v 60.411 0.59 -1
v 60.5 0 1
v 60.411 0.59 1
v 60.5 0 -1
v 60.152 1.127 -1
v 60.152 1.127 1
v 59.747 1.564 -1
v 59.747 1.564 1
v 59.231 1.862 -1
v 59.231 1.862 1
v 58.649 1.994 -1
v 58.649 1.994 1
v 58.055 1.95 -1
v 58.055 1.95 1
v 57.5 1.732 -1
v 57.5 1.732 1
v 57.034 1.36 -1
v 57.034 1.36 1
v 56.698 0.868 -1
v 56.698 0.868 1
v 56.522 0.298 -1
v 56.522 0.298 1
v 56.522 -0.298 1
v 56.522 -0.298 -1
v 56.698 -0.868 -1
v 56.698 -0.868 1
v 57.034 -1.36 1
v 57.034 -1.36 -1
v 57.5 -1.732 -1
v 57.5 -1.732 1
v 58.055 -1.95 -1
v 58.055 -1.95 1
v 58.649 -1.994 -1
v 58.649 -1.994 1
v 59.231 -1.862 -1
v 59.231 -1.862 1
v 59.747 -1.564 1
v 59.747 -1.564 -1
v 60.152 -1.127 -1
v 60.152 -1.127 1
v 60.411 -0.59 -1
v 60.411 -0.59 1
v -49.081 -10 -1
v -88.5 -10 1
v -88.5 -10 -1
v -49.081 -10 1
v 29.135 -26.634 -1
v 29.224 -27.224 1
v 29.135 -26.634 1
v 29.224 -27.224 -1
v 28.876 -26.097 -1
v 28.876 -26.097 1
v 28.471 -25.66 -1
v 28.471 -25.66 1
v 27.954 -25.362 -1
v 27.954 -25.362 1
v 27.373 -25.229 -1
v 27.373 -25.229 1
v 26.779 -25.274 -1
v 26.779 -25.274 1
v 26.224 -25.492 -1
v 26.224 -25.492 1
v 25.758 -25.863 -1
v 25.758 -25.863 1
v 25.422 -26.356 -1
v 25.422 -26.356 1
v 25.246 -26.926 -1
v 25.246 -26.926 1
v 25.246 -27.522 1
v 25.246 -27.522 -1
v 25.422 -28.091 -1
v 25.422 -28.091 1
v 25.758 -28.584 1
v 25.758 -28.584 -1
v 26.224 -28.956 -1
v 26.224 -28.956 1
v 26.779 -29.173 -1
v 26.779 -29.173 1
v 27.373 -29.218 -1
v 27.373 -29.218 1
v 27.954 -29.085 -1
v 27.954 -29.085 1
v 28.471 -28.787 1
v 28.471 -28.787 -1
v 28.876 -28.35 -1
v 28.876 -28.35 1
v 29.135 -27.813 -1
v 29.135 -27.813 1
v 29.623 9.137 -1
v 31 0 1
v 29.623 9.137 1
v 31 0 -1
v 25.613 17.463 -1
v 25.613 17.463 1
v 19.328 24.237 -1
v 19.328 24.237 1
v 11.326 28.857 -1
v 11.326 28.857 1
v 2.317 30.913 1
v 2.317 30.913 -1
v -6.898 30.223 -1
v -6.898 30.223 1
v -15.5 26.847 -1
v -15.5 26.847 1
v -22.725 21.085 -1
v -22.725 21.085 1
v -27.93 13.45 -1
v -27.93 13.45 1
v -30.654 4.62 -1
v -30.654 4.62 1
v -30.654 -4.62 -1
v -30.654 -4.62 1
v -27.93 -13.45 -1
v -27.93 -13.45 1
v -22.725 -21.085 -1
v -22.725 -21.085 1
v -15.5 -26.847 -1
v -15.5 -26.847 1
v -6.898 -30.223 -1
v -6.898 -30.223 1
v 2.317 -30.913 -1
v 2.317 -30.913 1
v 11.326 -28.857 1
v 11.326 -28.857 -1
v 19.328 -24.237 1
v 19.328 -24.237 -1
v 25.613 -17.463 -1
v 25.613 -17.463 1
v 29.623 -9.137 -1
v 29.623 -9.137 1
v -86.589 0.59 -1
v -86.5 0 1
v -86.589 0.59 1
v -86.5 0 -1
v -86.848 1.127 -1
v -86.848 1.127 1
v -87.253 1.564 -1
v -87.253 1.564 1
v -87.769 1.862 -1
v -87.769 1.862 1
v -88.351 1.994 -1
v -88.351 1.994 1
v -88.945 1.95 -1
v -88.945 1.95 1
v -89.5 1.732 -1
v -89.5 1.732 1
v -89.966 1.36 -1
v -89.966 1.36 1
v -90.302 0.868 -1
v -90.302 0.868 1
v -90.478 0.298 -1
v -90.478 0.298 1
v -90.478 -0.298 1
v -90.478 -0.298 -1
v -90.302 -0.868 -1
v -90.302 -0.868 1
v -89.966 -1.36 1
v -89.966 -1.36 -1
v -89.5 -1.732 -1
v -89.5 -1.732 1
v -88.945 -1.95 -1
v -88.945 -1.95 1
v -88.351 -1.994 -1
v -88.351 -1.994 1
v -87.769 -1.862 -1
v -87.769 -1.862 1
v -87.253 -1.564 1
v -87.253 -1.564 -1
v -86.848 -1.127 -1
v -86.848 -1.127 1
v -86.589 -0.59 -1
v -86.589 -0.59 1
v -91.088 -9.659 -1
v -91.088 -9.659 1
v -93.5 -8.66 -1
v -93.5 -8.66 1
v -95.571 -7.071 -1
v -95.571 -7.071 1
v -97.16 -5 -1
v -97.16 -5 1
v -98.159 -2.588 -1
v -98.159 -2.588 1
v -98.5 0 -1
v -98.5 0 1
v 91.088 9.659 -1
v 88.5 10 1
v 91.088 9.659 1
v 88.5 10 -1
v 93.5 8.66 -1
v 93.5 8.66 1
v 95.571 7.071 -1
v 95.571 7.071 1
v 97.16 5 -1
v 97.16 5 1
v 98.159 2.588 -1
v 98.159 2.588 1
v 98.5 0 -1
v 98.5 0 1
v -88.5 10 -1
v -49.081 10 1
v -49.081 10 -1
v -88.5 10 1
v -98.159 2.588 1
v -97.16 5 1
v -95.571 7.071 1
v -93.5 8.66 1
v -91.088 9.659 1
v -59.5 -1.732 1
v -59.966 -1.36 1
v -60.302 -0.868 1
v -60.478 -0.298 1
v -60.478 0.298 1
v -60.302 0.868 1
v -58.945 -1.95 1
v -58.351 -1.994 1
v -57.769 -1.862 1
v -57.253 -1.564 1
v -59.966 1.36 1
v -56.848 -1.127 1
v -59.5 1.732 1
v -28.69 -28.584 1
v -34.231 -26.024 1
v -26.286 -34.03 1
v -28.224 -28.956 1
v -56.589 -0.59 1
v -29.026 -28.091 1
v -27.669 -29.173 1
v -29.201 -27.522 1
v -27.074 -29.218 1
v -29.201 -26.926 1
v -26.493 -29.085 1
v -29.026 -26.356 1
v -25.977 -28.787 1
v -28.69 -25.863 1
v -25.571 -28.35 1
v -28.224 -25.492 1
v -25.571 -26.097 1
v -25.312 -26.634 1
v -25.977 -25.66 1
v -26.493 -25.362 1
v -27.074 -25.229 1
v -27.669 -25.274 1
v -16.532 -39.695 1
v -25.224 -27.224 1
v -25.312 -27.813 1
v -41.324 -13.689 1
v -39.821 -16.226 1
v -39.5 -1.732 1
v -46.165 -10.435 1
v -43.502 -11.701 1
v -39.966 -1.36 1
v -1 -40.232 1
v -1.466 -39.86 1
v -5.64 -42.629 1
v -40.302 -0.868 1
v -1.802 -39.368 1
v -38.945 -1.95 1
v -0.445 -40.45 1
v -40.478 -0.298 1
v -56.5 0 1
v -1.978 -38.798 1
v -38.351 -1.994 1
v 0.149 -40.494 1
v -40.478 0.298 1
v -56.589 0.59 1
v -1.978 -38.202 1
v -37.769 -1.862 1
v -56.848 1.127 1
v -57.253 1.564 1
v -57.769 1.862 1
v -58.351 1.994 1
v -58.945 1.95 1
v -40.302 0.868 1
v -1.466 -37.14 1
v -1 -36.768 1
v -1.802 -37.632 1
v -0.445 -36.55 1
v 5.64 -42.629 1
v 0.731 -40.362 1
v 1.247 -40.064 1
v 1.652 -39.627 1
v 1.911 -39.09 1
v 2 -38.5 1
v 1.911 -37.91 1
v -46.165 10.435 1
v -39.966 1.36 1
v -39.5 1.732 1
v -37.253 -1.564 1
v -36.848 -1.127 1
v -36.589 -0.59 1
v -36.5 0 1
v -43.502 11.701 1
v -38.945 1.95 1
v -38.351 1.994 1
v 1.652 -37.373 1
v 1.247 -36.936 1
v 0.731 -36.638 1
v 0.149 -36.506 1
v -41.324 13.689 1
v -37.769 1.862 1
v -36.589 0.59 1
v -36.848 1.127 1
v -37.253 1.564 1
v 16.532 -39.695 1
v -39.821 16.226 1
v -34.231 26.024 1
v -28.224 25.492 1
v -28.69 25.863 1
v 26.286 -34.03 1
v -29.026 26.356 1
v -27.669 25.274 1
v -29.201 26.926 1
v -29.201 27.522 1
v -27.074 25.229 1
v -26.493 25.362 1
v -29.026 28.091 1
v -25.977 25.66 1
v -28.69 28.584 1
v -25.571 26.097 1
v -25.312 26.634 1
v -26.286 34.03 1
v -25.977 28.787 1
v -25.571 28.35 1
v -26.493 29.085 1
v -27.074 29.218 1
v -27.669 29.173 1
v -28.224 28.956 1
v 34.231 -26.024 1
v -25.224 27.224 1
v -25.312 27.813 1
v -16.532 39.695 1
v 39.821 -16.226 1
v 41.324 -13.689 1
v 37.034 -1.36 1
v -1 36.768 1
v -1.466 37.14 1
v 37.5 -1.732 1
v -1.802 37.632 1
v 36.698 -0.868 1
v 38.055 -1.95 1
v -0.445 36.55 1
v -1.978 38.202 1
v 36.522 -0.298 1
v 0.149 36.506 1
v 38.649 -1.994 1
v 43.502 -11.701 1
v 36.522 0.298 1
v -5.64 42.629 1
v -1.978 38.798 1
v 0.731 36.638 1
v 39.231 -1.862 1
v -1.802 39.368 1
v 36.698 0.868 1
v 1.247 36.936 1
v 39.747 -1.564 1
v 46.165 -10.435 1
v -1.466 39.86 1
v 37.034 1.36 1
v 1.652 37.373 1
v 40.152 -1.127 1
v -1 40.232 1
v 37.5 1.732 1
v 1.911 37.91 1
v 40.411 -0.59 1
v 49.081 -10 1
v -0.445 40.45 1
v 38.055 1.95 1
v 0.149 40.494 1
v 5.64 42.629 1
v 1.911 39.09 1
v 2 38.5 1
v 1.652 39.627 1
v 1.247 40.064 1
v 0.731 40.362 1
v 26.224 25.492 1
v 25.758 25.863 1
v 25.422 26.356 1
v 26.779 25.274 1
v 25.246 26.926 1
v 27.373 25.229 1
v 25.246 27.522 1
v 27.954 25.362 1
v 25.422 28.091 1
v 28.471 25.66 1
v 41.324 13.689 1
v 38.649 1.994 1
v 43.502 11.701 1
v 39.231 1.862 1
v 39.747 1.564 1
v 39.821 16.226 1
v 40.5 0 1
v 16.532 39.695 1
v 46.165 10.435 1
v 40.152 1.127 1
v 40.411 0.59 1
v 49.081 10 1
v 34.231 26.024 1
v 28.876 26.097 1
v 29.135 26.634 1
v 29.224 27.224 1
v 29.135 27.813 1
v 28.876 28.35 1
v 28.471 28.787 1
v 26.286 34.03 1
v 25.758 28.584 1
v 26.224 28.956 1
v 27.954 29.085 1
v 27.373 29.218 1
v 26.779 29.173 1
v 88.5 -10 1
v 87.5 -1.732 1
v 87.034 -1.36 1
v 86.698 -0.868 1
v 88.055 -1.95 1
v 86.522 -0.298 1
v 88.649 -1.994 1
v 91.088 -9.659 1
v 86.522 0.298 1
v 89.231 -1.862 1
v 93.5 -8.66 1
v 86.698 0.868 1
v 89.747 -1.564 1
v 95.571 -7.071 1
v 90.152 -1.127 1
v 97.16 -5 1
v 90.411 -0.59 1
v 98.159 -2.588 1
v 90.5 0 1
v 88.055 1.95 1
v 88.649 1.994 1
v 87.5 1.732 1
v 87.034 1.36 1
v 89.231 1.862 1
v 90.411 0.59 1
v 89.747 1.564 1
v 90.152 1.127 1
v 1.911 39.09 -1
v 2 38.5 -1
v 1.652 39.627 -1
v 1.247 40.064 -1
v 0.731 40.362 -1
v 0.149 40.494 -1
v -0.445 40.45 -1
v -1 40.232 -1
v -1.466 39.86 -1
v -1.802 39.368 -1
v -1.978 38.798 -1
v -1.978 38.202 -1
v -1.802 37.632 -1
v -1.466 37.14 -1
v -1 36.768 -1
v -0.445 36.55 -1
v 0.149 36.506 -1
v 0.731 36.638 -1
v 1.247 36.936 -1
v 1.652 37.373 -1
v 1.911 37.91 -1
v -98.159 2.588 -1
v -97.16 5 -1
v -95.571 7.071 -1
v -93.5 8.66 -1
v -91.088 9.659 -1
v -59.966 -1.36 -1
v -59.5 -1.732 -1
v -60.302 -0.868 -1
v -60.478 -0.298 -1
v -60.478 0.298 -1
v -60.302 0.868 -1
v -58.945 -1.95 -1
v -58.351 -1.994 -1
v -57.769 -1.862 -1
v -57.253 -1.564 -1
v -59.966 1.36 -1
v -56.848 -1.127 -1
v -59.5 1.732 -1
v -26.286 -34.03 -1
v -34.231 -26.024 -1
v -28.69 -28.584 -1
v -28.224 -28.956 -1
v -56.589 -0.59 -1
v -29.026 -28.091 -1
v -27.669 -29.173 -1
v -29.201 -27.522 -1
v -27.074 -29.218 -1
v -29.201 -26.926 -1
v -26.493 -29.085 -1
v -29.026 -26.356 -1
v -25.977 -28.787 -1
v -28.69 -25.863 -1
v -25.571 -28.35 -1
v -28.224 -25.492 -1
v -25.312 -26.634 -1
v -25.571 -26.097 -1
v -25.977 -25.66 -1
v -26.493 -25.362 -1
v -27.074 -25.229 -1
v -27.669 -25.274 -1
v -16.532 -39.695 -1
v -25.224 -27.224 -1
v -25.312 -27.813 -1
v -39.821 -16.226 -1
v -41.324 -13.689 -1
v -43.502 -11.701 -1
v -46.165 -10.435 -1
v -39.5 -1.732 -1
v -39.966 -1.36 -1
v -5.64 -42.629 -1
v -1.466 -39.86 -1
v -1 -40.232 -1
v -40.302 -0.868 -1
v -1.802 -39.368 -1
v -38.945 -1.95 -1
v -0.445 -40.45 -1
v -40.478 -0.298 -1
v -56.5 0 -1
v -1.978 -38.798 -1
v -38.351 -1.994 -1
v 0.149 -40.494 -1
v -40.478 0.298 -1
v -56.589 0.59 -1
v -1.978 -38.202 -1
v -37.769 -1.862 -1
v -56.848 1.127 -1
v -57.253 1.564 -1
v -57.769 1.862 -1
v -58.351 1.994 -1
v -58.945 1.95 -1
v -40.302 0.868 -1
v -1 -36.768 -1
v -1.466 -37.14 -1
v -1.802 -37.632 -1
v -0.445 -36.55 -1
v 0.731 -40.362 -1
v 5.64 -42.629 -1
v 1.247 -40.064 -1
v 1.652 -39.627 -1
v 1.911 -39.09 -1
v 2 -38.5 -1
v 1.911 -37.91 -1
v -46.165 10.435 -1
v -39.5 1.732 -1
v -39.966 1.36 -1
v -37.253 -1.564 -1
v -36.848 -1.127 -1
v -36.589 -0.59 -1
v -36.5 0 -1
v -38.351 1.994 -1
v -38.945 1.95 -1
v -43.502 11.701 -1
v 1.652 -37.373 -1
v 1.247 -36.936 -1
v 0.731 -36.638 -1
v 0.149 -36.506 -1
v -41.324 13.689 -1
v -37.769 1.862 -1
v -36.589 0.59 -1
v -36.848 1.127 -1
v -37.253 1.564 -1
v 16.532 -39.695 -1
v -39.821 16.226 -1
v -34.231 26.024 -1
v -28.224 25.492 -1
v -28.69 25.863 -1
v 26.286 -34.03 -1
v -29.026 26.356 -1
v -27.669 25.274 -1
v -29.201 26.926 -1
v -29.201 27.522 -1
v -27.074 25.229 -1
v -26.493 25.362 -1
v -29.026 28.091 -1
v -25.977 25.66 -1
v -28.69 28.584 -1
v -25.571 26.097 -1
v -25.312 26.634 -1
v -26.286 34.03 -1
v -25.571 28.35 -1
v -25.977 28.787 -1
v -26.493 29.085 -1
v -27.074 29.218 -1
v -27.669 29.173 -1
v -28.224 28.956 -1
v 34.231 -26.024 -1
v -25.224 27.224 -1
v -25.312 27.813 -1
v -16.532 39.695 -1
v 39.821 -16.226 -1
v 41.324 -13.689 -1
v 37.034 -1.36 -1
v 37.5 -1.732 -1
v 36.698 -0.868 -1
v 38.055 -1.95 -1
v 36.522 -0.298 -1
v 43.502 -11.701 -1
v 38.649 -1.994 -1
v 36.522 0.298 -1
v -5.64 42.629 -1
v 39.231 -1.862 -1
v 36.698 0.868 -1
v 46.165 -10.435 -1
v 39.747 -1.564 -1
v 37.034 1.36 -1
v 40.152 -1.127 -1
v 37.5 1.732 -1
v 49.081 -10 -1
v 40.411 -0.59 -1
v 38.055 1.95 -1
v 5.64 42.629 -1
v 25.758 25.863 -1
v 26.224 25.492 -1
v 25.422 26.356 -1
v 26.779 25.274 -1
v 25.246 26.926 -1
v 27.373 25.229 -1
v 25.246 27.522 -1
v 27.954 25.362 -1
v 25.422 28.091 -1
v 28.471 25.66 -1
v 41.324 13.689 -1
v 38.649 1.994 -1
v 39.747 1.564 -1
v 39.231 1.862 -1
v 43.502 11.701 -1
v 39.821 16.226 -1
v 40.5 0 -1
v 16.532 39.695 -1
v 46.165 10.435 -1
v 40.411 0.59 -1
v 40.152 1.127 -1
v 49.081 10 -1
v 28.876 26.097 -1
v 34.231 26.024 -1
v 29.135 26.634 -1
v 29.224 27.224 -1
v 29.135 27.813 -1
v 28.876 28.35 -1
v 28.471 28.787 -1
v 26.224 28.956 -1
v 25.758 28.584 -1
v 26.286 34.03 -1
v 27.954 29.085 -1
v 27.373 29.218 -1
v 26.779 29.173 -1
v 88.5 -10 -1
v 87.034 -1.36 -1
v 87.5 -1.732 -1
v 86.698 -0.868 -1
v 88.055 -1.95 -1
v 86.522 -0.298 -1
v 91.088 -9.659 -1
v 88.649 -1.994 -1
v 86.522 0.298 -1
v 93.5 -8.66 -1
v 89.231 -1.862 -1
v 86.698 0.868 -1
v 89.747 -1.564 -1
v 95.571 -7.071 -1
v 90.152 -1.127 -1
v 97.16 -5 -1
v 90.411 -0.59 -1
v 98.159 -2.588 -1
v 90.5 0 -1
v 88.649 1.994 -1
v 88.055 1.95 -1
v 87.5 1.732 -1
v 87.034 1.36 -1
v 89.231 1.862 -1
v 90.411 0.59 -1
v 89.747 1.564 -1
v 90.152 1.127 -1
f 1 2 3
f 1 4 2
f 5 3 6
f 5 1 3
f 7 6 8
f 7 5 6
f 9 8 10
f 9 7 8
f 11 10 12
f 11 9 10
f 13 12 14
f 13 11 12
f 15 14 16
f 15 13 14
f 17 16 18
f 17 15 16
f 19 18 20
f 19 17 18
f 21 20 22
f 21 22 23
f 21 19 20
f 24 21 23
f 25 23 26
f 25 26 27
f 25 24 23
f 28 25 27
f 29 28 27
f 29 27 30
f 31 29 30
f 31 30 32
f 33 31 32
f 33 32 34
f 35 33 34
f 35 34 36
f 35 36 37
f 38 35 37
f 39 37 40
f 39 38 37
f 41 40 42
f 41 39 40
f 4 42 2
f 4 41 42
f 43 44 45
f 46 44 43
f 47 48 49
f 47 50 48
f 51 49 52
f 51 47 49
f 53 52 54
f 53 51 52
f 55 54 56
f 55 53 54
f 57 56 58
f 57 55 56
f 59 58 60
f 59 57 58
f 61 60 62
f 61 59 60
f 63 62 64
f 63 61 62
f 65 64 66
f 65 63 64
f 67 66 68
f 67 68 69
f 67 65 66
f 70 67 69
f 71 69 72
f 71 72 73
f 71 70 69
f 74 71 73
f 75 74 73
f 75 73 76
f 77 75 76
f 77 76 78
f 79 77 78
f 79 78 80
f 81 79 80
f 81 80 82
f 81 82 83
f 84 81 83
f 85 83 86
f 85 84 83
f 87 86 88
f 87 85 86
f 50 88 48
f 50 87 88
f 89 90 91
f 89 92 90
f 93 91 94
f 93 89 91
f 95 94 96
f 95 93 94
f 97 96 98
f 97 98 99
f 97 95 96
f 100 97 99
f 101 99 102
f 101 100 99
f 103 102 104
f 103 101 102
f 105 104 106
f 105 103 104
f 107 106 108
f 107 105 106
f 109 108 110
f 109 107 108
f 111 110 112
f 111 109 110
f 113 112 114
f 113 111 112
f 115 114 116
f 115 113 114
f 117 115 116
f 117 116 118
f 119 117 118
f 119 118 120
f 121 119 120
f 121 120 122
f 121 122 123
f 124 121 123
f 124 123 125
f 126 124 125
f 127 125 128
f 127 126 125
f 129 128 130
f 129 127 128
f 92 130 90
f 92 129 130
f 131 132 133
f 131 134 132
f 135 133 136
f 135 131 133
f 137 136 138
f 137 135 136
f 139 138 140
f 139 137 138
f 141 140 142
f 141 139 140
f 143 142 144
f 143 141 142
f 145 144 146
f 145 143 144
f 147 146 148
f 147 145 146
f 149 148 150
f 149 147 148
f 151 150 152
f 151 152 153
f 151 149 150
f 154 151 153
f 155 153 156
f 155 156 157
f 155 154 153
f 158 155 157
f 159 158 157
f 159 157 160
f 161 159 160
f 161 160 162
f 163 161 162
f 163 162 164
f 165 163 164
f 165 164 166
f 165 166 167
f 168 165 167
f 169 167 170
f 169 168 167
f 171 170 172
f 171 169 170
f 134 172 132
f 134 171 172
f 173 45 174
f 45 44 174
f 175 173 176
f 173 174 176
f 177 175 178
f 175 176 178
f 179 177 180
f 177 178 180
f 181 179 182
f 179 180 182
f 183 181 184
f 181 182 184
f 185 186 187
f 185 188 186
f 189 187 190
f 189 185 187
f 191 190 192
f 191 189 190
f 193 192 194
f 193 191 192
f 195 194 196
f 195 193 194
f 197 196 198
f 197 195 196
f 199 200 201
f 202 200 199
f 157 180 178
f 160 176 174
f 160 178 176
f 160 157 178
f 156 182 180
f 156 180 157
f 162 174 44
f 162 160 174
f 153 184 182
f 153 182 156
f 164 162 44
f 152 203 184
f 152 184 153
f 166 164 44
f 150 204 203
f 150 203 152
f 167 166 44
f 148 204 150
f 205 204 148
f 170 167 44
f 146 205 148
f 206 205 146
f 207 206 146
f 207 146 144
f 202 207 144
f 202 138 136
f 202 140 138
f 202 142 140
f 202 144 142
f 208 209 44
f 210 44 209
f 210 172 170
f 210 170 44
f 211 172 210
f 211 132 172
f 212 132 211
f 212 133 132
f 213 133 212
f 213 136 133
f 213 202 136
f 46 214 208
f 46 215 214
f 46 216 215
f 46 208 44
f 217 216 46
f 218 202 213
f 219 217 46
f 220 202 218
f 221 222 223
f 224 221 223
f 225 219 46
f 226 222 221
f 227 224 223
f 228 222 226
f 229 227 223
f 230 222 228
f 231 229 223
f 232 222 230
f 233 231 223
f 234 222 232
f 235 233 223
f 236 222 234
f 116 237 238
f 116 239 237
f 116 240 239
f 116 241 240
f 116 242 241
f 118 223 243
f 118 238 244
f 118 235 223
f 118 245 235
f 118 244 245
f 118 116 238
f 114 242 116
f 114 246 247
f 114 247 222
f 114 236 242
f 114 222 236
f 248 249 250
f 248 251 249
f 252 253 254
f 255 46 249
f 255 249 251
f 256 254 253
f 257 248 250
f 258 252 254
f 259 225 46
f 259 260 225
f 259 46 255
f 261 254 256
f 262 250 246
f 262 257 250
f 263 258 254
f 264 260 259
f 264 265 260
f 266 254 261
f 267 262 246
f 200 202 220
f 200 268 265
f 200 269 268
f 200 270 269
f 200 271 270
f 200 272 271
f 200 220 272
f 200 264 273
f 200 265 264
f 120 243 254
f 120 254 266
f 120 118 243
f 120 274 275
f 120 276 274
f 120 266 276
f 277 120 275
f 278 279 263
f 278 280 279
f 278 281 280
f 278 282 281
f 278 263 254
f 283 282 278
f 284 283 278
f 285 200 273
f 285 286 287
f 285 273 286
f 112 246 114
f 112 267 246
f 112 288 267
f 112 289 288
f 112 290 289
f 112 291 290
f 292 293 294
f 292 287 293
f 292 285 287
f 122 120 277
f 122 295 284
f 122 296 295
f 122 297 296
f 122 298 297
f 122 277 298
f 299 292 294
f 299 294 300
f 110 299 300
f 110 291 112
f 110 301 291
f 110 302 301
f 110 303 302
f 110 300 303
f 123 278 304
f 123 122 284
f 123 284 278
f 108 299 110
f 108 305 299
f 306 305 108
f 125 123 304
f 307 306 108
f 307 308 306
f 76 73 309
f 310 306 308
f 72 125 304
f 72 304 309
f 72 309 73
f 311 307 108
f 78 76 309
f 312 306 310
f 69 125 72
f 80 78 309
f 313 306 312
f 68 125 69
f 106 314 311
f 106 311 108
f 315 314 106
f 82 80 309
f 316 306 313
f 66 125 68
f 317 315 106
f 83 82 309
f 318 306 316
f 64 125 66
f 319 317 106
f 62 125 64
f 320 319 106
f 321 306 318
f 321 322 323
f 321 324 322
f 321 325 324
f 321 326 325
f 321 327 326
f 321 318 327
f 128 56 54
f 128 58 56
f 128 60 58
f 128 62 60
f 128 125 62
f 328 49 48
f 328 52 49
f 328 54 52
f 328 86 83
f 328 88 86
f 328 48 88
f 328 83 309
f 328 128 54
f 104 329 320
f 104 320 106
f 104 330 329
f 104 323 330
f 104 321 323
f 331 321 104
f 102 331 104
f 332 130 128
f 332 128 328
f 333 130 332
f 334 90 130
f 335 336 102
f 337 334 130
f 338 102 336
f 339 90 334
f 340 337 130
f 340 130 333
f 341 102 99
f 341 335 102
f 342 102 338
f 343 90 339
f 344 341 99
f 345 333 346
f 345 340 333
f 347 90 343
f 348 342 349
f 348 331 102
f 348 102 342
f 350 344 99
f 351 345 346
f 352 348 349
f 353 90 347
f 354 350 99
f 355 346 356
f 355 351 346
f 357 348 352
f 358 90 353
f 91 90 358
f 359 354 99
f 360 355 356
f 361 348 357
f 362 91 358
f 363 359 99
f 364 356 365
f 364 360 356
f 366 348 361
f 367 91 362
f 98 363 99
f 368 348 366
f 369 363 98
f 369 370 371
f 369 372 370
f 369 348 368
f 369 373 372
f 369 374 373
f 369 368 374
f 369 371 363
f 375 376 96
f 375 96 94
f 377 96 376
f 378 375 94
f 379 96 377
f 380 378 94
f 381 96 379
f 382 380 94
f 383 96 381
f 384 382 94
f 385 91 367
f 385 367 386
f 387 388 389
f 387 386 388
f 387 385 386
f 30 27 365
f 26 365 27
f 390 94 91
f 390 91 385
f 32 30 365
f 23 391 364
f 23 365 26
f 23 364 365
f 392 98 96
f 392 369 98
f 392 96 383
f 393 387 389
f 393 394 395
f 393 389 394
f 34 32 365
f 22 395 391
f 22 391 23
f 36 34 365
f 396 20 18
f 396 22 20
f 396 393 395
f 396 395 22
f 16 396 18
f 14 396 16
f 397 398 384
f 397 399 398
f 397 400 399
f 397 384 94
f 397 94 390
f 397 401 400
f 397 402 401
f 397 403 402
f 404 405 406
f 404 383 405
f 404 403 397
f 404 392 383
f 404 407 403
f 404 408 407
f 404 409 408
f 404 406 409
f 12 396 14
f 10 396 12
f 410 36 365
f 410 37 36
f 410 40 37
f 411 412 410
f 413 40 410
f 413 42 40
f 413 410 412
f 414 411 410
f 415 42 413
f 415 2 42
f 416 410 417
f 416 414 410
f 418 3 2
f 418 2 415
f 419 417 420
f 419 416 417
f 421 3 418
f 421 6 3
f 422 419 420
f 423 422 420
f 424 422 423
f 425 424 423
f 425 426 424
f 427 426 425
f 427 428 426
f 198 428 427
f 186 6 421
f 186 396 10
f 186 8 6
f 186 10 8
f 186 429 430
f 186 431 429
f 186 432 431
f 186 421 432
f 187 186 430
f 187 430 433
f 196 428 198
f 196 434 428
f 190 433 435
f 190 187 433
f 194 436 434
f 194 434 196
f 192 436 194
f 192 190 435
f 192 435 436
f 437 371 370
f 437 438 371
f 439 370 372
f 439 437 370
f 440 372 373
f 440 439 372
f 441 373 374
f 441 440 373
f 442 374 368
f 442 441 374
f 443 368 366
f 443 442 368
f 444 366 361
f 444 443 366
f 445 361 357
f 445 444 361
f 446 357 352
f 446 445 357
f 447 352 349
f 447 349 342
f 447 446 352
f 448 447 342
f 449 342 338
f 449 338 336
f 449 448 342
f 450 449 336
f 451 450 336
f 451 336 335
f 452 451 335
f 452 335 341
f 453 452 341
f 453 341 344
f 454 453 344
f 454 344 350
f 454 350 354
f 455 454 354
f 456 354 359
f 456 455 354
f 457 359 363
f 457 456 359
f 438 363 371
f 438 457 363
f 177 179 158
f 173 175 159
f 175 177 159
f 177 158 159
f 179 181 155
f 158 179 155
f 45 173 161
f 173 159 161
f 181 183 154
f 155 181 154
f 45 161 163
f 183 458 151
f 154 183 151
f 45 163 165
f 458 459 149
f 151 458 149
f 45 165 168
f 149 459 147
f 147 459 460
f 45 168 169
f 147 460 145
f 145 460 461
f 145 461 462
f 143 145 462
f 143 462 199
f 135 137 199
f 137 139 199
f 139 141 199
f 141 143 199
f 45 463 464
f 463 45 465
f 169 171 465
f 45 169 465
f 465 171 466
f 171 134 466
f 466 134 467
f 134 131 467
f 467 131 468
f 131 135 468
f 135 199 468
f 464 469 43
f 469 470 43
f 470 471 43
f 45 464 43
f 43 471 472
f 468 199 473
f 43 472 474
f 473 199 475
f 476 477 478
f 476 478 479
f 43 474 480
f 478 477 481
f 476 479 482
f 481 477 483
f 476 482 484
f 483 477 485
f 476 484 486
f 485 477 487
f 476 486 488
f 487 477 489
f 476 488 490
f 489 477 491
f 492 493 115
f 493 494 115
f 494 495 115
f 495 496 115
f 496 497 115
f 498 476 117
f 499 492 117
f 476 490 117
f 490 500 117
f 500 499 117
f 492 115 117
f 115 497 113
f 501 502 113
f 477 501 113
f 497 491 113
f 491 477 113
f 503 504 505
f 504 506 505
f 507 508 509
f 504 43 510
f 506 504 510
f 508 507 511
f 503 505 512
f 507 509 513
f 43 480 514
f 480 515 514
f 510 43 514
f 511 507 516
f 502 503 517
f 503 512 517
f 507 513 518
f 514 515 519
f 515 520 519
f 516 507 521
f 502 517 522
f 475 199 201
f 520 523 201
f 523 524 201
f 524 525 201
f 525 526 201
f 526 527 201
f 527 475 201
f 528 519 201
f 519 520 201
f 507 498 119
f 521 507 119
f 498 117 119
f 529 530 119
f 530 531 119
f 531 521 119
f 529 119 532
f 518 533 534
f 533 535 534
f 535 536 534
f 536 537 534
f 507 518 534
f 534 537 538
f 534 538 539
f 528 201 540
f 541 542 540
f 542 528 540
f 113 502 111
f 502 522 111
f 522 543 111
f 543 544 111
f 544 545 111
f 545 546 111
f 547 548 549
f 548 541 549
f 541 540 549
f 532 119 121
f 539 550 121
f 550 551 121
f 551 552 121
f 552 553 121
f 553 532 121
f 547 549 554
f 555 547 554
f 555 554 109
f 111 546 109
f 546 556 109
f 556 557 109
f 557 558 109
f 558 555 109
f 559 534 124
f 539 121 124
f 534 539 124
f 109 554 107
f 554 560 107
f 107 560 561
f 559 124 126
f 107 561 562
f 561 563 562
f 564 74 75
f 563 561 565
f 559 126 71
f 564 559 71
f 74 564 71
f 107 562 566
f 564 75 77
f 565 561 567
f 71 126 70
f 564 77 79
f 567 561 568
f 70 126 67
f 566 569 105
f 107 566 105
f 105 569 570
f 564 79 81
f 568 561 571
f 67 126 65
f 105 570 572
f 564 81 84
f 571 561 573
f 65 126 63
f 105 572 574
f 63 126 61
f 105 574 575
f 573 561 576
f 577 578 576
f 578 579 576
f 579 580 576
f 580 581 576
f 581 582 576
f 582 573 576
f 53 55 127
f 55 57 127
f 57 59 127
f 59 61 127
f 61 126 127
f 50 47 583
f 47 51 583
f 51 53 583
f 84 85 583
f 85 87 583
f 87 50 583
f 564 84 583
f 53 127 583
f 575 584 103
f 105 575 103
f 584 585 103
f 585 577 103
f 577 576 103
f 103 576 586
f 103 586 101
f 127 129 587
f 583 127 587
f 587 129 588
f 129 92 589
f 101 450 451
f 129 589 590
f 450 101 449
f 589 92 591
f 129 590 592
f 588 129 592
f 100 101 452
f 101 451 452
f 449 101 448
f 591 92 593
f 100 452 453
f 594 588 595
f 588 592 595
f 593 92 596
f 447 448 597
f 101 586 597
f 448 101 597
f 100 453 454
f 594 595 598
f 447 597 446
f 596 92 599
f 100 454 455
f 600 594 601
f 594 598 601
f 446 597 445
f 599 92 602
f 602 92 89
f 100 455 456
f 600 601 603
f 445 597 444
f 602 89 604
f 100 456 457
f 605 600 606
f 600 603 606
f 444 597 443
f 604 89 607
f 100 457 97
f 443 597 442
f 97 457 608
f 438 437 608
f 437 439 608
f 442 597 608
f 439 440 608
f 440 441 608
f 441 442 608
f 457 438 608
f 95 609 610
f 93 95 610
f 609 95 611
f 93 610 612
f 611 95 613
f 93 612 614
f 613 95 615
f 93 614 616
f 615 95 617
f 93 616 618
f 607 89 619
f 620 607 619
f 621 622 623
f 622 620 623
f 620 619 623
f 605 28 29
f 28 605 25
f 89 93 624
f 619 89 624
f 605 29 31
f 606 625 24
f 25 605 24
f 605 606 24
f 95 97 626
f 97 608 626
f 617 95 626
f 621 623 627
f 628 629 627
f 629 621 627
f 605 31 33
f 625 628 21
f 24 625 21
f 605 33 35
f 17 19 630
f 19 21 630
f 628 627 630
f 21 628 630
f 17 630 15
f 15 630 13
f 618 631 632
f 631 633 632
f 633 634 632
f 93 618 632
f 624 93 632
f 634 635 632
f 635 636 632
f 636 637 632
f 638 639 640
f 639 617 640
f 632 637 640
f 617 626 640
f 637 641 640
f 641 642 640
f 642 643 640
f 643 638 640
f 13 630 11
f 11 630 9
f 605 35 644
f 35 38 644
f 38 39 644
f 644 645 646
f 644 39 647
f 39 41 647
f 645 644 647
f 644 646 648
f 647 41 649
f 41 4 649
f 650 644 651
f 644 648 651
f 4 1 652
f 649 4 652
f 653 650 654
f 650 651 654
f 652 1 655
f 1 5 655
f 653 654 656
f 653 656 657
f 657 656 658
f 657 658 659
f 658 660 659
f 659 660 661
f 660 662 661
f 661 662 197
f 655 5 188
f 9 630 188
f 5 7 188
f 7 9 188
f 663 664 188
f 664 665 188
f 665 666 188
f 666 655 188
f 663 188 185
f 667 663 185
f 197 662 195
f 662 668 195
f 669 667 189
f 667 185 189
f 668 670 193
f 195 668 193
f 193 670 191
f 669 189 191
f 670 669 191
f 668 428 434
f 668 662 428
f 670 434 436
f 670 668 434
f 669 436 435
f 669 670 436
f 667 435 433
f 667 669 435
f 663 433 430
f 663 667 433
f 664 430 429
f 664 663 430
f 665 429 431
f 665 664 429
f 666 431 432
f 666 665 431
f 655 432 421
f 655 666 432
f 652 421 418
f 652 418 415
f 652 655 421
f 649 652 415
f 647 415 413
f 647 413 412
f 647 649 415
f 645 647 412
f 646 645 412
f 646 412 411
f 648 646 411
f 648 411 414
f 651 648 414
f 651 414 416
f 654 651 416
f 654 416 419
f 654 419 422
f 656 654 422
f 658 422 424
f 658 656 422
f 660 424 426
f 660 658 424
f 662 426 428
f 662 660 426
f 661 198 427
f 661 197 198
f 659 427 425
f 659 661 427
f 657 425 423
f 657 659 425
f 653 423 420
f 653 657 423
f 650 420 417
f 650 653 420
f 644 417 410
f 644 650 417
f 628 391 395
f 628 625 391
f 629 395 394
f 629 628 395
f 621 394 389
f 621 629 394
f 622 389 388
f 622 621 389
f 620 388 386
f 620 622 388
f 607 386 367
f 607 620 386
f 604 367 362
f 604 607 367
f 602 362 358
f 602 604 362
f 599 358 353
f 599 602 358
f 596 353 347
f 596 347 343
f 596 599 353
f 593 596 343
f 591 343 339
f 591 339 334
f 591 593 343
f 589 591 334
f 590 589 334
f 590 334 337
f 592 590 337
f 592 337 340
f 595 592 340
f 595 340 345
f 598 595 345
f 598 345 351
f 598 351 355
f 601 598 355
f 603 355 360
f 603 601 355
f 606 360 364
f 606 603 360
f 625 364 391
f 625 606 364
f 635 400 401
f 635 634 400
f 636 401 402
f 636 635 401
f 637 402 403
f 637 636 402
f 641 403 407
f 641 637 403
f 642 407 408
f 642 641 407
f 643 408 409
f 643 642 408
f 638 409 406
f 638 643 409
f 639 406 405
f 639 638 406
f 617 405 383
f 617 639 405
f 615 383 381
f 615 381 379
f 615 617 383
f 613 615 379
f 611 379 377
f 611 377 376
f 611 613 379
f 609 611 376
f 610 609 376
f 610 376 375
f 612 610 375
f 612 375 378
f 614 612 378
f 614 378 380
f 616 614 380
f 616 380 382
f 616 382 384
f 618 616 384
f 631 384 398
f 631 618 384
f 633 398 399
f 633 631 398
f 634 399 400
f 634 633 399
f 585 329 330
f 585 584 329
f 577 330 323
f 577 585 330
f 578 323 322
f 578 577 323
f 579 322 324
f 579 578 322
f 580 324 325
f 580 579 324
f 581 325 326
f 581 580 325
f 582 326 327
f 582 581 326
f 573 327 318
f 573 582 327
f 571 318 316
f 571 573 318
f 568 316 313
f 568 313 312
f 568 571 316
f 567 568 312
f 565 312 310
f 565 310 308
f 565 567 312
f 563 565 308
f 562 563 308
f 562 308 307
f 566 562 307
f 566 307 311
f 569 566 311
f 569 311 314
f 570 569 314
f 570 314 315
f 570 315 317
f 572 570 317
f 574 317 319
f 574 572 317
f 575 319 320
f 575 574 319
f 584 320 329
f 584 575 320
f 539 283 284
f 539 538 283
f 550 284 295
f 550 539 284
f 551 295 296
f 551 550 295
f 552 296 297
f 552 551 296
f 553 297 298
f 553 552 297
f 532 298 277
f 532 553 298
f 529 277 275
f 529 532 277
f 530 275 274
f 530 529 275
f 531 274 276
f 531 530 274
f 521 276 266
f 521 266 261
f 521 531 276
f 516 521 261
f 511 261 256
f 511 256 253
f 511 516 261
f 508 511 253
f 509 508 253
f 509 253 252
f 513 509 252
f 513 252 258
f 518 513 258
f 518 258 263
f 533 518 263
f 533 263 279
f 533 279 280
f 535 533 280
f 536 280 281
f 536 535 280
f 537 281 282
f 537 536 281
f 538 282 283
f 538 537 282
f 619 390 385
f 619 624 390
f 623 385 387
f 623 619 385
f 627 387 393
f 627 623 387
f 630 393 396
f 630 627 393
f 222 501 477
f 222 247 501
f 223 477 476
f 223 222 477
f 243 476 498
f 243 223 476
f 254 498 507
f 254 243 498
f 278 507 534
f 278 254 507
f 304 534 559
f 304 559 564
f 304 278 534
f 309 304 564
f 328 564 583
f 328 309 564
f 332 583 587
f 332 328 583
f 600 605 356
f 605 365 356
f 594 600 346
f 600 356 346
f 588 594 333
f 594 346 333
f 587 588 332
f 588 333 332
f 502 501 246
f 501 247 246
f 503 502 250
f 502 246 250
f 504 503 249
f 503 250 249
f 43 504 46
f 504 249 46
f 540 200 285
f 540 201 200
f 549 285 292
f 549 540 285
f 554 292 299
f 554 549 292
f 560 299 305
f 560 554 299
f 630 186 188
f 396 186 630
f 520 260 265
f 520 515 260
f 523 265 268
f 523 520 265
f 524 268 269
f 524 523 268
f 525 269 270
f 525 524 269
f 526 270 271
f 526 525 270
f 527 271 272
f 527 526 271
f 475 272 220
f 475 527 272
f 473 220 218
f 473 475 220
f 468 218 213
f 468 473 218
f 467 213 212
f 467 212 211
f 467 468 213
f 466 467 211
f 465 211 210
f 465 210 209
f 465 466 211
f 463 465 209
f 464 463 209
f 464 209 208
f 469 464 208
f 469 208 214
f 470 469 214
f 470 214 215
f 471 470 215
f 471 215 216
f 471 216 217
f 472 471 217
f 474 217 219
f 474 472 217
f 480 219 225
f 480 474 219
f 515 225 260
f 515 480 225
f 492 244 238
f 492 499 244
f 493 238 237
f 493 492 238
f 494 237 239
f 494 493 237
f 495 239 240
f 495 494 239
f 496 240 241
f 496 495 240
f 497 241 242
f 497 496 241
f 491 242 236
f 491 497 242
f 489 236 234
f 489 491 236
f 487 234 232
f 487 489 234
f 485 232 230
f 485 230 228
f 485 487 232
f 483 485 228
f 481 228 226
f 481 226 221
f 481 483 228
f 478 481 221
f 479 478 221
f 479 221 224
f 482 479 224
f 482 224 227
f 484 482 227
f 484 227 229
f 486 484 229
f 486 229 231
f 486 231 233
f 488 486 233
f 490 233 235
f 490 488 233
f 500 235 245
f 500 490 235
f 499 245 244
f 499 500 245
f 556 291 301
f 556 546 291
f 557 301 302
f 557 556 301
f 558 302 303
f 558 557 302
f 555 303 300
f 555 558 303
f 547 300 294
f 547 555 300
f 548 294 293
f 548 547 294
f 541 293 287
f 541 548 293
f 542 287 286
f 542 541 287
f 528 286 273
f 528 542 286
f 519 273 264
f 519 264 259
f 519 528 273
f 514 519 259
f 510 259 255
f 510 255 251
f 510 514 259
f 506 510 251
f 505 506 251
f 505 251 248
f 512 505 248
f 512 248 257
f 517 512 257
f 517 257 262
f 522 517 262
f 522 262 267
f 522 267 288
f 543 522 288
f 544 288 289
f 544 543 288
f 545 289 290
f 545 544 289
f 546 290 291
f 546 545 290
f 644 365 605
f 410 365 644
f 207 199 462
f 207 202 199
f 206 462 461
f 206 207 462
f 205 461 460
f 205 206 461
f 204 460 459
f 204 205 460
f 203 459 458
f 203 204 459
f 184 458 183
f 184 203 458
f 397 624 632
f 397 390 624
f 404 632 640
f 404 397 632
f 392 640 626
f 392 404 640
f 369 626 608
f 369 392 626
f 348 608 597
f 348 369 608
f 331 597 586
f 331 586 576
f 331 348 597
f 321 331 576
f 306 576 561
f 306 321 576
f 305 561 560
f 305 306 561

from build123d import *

# Parameters (mm, degrees)
SKETCH1_R           = 31
SKETCH1_R_2         = 2
BOSS_EXTRUDE1_DEPTH = 1
FILLET1_R           = 10


with BuildPart() as part:
    # Sketch1 → Boss-Extrude1 (new, symmetric)
    with BuildSketch(Plane.XY):
        with BuildLine():
            Line((-41.821047333, 10), (-98.5, 10))
            Line((-98.5, 10), (-98.5, -10))
            Line((-98.5, -10), (-41.821047333, -10))
            ThreePointArc((-41.821047333, -10), (0, -43), (41.821047333, -10))
            Line((41.821047333, -10), (98.5, -10))
            Line((98.5, -10), (98.5, 10))
            Line((98.5, 10), (41.821047333, 10))
            ThreePointArc((41.821047333, 10), (0, 43), (-41.821047333, 10))
        make_face()
        Circle(SKETCH1_R, mode=Mode.SUBTRACT)
        with Locations((0, 38.5)):
            Circle(SKETCH1_R_2, mode=Mode.SUBTRACT)
        with Locations((27.223611076, 27.223611076)):
            Circle(SKETCH1_R_2, mode=Mode.SUBTRACT)
        with Locations((38.5, 0)):
            Circle(SKETCH1_R_2, mode=Mode.SUBTRACT)
        with Locations((27.223611076, -27.223611076)):
            Circle(SKETCH1_R_2, mode=Mode.SUBTRACT)
        with Locations((0, -38.5)):
            Circle(SKETCH1_R_2, mode=Mode.SUBTRACT)
        with Locations((-27.223611076, -27.223611076)):
            Circle(SKETCH1_R_2, mode=Mode.SUBTRACT)
        with Locations((-38.5, 0)):
            Circle(SKETCH1_R_2, mode=Mode.SUBTRACT)
        with Locations((-27.223611076, 27.223611076)):
            Circle(SKETCH1_R_2, mode=Mode.SUBTRACT)
        with Locations((-58.5, 0)):
            Circle(SKETCH1_R_2, mode=Mode.SUBTRACT)
        with Locations((-88.5, 0)):
            Circle(SKETCH1_R_2, mode=Mode.SUBTRACT)
        with Locations((58.5, 0)):
            Circle(SKETCH1_R_2, mode=Mode.SUBTRACT)
        with Locations((88.5, 0)):
            Circle(SKETCH1_R_2, mode=Mode.SUBTRACT)
    extrude(amount=BOSS_EXTRUDE1_DEPTH, both=True)

    # Fillet1
    fillet1_edges = [part.edges().sort_by_distance(p)[0] for p in [
        (98.5, -10, 0),
        (98.5, 10, 0),
        (41.821047333, -10, 0),
        (41.821047333, 10, 0),
        (-41.821047333, -10, 0),
        (-98.5, -10, 0),
        (-98.5, 10, 0),
        (-41.821047333, 10, 0),
    ]]
    fillet(fillet1_edges, radius=FILLET1_R - 0.0001)  # a hair under: the kernel refuses the full size


solid = part.part
